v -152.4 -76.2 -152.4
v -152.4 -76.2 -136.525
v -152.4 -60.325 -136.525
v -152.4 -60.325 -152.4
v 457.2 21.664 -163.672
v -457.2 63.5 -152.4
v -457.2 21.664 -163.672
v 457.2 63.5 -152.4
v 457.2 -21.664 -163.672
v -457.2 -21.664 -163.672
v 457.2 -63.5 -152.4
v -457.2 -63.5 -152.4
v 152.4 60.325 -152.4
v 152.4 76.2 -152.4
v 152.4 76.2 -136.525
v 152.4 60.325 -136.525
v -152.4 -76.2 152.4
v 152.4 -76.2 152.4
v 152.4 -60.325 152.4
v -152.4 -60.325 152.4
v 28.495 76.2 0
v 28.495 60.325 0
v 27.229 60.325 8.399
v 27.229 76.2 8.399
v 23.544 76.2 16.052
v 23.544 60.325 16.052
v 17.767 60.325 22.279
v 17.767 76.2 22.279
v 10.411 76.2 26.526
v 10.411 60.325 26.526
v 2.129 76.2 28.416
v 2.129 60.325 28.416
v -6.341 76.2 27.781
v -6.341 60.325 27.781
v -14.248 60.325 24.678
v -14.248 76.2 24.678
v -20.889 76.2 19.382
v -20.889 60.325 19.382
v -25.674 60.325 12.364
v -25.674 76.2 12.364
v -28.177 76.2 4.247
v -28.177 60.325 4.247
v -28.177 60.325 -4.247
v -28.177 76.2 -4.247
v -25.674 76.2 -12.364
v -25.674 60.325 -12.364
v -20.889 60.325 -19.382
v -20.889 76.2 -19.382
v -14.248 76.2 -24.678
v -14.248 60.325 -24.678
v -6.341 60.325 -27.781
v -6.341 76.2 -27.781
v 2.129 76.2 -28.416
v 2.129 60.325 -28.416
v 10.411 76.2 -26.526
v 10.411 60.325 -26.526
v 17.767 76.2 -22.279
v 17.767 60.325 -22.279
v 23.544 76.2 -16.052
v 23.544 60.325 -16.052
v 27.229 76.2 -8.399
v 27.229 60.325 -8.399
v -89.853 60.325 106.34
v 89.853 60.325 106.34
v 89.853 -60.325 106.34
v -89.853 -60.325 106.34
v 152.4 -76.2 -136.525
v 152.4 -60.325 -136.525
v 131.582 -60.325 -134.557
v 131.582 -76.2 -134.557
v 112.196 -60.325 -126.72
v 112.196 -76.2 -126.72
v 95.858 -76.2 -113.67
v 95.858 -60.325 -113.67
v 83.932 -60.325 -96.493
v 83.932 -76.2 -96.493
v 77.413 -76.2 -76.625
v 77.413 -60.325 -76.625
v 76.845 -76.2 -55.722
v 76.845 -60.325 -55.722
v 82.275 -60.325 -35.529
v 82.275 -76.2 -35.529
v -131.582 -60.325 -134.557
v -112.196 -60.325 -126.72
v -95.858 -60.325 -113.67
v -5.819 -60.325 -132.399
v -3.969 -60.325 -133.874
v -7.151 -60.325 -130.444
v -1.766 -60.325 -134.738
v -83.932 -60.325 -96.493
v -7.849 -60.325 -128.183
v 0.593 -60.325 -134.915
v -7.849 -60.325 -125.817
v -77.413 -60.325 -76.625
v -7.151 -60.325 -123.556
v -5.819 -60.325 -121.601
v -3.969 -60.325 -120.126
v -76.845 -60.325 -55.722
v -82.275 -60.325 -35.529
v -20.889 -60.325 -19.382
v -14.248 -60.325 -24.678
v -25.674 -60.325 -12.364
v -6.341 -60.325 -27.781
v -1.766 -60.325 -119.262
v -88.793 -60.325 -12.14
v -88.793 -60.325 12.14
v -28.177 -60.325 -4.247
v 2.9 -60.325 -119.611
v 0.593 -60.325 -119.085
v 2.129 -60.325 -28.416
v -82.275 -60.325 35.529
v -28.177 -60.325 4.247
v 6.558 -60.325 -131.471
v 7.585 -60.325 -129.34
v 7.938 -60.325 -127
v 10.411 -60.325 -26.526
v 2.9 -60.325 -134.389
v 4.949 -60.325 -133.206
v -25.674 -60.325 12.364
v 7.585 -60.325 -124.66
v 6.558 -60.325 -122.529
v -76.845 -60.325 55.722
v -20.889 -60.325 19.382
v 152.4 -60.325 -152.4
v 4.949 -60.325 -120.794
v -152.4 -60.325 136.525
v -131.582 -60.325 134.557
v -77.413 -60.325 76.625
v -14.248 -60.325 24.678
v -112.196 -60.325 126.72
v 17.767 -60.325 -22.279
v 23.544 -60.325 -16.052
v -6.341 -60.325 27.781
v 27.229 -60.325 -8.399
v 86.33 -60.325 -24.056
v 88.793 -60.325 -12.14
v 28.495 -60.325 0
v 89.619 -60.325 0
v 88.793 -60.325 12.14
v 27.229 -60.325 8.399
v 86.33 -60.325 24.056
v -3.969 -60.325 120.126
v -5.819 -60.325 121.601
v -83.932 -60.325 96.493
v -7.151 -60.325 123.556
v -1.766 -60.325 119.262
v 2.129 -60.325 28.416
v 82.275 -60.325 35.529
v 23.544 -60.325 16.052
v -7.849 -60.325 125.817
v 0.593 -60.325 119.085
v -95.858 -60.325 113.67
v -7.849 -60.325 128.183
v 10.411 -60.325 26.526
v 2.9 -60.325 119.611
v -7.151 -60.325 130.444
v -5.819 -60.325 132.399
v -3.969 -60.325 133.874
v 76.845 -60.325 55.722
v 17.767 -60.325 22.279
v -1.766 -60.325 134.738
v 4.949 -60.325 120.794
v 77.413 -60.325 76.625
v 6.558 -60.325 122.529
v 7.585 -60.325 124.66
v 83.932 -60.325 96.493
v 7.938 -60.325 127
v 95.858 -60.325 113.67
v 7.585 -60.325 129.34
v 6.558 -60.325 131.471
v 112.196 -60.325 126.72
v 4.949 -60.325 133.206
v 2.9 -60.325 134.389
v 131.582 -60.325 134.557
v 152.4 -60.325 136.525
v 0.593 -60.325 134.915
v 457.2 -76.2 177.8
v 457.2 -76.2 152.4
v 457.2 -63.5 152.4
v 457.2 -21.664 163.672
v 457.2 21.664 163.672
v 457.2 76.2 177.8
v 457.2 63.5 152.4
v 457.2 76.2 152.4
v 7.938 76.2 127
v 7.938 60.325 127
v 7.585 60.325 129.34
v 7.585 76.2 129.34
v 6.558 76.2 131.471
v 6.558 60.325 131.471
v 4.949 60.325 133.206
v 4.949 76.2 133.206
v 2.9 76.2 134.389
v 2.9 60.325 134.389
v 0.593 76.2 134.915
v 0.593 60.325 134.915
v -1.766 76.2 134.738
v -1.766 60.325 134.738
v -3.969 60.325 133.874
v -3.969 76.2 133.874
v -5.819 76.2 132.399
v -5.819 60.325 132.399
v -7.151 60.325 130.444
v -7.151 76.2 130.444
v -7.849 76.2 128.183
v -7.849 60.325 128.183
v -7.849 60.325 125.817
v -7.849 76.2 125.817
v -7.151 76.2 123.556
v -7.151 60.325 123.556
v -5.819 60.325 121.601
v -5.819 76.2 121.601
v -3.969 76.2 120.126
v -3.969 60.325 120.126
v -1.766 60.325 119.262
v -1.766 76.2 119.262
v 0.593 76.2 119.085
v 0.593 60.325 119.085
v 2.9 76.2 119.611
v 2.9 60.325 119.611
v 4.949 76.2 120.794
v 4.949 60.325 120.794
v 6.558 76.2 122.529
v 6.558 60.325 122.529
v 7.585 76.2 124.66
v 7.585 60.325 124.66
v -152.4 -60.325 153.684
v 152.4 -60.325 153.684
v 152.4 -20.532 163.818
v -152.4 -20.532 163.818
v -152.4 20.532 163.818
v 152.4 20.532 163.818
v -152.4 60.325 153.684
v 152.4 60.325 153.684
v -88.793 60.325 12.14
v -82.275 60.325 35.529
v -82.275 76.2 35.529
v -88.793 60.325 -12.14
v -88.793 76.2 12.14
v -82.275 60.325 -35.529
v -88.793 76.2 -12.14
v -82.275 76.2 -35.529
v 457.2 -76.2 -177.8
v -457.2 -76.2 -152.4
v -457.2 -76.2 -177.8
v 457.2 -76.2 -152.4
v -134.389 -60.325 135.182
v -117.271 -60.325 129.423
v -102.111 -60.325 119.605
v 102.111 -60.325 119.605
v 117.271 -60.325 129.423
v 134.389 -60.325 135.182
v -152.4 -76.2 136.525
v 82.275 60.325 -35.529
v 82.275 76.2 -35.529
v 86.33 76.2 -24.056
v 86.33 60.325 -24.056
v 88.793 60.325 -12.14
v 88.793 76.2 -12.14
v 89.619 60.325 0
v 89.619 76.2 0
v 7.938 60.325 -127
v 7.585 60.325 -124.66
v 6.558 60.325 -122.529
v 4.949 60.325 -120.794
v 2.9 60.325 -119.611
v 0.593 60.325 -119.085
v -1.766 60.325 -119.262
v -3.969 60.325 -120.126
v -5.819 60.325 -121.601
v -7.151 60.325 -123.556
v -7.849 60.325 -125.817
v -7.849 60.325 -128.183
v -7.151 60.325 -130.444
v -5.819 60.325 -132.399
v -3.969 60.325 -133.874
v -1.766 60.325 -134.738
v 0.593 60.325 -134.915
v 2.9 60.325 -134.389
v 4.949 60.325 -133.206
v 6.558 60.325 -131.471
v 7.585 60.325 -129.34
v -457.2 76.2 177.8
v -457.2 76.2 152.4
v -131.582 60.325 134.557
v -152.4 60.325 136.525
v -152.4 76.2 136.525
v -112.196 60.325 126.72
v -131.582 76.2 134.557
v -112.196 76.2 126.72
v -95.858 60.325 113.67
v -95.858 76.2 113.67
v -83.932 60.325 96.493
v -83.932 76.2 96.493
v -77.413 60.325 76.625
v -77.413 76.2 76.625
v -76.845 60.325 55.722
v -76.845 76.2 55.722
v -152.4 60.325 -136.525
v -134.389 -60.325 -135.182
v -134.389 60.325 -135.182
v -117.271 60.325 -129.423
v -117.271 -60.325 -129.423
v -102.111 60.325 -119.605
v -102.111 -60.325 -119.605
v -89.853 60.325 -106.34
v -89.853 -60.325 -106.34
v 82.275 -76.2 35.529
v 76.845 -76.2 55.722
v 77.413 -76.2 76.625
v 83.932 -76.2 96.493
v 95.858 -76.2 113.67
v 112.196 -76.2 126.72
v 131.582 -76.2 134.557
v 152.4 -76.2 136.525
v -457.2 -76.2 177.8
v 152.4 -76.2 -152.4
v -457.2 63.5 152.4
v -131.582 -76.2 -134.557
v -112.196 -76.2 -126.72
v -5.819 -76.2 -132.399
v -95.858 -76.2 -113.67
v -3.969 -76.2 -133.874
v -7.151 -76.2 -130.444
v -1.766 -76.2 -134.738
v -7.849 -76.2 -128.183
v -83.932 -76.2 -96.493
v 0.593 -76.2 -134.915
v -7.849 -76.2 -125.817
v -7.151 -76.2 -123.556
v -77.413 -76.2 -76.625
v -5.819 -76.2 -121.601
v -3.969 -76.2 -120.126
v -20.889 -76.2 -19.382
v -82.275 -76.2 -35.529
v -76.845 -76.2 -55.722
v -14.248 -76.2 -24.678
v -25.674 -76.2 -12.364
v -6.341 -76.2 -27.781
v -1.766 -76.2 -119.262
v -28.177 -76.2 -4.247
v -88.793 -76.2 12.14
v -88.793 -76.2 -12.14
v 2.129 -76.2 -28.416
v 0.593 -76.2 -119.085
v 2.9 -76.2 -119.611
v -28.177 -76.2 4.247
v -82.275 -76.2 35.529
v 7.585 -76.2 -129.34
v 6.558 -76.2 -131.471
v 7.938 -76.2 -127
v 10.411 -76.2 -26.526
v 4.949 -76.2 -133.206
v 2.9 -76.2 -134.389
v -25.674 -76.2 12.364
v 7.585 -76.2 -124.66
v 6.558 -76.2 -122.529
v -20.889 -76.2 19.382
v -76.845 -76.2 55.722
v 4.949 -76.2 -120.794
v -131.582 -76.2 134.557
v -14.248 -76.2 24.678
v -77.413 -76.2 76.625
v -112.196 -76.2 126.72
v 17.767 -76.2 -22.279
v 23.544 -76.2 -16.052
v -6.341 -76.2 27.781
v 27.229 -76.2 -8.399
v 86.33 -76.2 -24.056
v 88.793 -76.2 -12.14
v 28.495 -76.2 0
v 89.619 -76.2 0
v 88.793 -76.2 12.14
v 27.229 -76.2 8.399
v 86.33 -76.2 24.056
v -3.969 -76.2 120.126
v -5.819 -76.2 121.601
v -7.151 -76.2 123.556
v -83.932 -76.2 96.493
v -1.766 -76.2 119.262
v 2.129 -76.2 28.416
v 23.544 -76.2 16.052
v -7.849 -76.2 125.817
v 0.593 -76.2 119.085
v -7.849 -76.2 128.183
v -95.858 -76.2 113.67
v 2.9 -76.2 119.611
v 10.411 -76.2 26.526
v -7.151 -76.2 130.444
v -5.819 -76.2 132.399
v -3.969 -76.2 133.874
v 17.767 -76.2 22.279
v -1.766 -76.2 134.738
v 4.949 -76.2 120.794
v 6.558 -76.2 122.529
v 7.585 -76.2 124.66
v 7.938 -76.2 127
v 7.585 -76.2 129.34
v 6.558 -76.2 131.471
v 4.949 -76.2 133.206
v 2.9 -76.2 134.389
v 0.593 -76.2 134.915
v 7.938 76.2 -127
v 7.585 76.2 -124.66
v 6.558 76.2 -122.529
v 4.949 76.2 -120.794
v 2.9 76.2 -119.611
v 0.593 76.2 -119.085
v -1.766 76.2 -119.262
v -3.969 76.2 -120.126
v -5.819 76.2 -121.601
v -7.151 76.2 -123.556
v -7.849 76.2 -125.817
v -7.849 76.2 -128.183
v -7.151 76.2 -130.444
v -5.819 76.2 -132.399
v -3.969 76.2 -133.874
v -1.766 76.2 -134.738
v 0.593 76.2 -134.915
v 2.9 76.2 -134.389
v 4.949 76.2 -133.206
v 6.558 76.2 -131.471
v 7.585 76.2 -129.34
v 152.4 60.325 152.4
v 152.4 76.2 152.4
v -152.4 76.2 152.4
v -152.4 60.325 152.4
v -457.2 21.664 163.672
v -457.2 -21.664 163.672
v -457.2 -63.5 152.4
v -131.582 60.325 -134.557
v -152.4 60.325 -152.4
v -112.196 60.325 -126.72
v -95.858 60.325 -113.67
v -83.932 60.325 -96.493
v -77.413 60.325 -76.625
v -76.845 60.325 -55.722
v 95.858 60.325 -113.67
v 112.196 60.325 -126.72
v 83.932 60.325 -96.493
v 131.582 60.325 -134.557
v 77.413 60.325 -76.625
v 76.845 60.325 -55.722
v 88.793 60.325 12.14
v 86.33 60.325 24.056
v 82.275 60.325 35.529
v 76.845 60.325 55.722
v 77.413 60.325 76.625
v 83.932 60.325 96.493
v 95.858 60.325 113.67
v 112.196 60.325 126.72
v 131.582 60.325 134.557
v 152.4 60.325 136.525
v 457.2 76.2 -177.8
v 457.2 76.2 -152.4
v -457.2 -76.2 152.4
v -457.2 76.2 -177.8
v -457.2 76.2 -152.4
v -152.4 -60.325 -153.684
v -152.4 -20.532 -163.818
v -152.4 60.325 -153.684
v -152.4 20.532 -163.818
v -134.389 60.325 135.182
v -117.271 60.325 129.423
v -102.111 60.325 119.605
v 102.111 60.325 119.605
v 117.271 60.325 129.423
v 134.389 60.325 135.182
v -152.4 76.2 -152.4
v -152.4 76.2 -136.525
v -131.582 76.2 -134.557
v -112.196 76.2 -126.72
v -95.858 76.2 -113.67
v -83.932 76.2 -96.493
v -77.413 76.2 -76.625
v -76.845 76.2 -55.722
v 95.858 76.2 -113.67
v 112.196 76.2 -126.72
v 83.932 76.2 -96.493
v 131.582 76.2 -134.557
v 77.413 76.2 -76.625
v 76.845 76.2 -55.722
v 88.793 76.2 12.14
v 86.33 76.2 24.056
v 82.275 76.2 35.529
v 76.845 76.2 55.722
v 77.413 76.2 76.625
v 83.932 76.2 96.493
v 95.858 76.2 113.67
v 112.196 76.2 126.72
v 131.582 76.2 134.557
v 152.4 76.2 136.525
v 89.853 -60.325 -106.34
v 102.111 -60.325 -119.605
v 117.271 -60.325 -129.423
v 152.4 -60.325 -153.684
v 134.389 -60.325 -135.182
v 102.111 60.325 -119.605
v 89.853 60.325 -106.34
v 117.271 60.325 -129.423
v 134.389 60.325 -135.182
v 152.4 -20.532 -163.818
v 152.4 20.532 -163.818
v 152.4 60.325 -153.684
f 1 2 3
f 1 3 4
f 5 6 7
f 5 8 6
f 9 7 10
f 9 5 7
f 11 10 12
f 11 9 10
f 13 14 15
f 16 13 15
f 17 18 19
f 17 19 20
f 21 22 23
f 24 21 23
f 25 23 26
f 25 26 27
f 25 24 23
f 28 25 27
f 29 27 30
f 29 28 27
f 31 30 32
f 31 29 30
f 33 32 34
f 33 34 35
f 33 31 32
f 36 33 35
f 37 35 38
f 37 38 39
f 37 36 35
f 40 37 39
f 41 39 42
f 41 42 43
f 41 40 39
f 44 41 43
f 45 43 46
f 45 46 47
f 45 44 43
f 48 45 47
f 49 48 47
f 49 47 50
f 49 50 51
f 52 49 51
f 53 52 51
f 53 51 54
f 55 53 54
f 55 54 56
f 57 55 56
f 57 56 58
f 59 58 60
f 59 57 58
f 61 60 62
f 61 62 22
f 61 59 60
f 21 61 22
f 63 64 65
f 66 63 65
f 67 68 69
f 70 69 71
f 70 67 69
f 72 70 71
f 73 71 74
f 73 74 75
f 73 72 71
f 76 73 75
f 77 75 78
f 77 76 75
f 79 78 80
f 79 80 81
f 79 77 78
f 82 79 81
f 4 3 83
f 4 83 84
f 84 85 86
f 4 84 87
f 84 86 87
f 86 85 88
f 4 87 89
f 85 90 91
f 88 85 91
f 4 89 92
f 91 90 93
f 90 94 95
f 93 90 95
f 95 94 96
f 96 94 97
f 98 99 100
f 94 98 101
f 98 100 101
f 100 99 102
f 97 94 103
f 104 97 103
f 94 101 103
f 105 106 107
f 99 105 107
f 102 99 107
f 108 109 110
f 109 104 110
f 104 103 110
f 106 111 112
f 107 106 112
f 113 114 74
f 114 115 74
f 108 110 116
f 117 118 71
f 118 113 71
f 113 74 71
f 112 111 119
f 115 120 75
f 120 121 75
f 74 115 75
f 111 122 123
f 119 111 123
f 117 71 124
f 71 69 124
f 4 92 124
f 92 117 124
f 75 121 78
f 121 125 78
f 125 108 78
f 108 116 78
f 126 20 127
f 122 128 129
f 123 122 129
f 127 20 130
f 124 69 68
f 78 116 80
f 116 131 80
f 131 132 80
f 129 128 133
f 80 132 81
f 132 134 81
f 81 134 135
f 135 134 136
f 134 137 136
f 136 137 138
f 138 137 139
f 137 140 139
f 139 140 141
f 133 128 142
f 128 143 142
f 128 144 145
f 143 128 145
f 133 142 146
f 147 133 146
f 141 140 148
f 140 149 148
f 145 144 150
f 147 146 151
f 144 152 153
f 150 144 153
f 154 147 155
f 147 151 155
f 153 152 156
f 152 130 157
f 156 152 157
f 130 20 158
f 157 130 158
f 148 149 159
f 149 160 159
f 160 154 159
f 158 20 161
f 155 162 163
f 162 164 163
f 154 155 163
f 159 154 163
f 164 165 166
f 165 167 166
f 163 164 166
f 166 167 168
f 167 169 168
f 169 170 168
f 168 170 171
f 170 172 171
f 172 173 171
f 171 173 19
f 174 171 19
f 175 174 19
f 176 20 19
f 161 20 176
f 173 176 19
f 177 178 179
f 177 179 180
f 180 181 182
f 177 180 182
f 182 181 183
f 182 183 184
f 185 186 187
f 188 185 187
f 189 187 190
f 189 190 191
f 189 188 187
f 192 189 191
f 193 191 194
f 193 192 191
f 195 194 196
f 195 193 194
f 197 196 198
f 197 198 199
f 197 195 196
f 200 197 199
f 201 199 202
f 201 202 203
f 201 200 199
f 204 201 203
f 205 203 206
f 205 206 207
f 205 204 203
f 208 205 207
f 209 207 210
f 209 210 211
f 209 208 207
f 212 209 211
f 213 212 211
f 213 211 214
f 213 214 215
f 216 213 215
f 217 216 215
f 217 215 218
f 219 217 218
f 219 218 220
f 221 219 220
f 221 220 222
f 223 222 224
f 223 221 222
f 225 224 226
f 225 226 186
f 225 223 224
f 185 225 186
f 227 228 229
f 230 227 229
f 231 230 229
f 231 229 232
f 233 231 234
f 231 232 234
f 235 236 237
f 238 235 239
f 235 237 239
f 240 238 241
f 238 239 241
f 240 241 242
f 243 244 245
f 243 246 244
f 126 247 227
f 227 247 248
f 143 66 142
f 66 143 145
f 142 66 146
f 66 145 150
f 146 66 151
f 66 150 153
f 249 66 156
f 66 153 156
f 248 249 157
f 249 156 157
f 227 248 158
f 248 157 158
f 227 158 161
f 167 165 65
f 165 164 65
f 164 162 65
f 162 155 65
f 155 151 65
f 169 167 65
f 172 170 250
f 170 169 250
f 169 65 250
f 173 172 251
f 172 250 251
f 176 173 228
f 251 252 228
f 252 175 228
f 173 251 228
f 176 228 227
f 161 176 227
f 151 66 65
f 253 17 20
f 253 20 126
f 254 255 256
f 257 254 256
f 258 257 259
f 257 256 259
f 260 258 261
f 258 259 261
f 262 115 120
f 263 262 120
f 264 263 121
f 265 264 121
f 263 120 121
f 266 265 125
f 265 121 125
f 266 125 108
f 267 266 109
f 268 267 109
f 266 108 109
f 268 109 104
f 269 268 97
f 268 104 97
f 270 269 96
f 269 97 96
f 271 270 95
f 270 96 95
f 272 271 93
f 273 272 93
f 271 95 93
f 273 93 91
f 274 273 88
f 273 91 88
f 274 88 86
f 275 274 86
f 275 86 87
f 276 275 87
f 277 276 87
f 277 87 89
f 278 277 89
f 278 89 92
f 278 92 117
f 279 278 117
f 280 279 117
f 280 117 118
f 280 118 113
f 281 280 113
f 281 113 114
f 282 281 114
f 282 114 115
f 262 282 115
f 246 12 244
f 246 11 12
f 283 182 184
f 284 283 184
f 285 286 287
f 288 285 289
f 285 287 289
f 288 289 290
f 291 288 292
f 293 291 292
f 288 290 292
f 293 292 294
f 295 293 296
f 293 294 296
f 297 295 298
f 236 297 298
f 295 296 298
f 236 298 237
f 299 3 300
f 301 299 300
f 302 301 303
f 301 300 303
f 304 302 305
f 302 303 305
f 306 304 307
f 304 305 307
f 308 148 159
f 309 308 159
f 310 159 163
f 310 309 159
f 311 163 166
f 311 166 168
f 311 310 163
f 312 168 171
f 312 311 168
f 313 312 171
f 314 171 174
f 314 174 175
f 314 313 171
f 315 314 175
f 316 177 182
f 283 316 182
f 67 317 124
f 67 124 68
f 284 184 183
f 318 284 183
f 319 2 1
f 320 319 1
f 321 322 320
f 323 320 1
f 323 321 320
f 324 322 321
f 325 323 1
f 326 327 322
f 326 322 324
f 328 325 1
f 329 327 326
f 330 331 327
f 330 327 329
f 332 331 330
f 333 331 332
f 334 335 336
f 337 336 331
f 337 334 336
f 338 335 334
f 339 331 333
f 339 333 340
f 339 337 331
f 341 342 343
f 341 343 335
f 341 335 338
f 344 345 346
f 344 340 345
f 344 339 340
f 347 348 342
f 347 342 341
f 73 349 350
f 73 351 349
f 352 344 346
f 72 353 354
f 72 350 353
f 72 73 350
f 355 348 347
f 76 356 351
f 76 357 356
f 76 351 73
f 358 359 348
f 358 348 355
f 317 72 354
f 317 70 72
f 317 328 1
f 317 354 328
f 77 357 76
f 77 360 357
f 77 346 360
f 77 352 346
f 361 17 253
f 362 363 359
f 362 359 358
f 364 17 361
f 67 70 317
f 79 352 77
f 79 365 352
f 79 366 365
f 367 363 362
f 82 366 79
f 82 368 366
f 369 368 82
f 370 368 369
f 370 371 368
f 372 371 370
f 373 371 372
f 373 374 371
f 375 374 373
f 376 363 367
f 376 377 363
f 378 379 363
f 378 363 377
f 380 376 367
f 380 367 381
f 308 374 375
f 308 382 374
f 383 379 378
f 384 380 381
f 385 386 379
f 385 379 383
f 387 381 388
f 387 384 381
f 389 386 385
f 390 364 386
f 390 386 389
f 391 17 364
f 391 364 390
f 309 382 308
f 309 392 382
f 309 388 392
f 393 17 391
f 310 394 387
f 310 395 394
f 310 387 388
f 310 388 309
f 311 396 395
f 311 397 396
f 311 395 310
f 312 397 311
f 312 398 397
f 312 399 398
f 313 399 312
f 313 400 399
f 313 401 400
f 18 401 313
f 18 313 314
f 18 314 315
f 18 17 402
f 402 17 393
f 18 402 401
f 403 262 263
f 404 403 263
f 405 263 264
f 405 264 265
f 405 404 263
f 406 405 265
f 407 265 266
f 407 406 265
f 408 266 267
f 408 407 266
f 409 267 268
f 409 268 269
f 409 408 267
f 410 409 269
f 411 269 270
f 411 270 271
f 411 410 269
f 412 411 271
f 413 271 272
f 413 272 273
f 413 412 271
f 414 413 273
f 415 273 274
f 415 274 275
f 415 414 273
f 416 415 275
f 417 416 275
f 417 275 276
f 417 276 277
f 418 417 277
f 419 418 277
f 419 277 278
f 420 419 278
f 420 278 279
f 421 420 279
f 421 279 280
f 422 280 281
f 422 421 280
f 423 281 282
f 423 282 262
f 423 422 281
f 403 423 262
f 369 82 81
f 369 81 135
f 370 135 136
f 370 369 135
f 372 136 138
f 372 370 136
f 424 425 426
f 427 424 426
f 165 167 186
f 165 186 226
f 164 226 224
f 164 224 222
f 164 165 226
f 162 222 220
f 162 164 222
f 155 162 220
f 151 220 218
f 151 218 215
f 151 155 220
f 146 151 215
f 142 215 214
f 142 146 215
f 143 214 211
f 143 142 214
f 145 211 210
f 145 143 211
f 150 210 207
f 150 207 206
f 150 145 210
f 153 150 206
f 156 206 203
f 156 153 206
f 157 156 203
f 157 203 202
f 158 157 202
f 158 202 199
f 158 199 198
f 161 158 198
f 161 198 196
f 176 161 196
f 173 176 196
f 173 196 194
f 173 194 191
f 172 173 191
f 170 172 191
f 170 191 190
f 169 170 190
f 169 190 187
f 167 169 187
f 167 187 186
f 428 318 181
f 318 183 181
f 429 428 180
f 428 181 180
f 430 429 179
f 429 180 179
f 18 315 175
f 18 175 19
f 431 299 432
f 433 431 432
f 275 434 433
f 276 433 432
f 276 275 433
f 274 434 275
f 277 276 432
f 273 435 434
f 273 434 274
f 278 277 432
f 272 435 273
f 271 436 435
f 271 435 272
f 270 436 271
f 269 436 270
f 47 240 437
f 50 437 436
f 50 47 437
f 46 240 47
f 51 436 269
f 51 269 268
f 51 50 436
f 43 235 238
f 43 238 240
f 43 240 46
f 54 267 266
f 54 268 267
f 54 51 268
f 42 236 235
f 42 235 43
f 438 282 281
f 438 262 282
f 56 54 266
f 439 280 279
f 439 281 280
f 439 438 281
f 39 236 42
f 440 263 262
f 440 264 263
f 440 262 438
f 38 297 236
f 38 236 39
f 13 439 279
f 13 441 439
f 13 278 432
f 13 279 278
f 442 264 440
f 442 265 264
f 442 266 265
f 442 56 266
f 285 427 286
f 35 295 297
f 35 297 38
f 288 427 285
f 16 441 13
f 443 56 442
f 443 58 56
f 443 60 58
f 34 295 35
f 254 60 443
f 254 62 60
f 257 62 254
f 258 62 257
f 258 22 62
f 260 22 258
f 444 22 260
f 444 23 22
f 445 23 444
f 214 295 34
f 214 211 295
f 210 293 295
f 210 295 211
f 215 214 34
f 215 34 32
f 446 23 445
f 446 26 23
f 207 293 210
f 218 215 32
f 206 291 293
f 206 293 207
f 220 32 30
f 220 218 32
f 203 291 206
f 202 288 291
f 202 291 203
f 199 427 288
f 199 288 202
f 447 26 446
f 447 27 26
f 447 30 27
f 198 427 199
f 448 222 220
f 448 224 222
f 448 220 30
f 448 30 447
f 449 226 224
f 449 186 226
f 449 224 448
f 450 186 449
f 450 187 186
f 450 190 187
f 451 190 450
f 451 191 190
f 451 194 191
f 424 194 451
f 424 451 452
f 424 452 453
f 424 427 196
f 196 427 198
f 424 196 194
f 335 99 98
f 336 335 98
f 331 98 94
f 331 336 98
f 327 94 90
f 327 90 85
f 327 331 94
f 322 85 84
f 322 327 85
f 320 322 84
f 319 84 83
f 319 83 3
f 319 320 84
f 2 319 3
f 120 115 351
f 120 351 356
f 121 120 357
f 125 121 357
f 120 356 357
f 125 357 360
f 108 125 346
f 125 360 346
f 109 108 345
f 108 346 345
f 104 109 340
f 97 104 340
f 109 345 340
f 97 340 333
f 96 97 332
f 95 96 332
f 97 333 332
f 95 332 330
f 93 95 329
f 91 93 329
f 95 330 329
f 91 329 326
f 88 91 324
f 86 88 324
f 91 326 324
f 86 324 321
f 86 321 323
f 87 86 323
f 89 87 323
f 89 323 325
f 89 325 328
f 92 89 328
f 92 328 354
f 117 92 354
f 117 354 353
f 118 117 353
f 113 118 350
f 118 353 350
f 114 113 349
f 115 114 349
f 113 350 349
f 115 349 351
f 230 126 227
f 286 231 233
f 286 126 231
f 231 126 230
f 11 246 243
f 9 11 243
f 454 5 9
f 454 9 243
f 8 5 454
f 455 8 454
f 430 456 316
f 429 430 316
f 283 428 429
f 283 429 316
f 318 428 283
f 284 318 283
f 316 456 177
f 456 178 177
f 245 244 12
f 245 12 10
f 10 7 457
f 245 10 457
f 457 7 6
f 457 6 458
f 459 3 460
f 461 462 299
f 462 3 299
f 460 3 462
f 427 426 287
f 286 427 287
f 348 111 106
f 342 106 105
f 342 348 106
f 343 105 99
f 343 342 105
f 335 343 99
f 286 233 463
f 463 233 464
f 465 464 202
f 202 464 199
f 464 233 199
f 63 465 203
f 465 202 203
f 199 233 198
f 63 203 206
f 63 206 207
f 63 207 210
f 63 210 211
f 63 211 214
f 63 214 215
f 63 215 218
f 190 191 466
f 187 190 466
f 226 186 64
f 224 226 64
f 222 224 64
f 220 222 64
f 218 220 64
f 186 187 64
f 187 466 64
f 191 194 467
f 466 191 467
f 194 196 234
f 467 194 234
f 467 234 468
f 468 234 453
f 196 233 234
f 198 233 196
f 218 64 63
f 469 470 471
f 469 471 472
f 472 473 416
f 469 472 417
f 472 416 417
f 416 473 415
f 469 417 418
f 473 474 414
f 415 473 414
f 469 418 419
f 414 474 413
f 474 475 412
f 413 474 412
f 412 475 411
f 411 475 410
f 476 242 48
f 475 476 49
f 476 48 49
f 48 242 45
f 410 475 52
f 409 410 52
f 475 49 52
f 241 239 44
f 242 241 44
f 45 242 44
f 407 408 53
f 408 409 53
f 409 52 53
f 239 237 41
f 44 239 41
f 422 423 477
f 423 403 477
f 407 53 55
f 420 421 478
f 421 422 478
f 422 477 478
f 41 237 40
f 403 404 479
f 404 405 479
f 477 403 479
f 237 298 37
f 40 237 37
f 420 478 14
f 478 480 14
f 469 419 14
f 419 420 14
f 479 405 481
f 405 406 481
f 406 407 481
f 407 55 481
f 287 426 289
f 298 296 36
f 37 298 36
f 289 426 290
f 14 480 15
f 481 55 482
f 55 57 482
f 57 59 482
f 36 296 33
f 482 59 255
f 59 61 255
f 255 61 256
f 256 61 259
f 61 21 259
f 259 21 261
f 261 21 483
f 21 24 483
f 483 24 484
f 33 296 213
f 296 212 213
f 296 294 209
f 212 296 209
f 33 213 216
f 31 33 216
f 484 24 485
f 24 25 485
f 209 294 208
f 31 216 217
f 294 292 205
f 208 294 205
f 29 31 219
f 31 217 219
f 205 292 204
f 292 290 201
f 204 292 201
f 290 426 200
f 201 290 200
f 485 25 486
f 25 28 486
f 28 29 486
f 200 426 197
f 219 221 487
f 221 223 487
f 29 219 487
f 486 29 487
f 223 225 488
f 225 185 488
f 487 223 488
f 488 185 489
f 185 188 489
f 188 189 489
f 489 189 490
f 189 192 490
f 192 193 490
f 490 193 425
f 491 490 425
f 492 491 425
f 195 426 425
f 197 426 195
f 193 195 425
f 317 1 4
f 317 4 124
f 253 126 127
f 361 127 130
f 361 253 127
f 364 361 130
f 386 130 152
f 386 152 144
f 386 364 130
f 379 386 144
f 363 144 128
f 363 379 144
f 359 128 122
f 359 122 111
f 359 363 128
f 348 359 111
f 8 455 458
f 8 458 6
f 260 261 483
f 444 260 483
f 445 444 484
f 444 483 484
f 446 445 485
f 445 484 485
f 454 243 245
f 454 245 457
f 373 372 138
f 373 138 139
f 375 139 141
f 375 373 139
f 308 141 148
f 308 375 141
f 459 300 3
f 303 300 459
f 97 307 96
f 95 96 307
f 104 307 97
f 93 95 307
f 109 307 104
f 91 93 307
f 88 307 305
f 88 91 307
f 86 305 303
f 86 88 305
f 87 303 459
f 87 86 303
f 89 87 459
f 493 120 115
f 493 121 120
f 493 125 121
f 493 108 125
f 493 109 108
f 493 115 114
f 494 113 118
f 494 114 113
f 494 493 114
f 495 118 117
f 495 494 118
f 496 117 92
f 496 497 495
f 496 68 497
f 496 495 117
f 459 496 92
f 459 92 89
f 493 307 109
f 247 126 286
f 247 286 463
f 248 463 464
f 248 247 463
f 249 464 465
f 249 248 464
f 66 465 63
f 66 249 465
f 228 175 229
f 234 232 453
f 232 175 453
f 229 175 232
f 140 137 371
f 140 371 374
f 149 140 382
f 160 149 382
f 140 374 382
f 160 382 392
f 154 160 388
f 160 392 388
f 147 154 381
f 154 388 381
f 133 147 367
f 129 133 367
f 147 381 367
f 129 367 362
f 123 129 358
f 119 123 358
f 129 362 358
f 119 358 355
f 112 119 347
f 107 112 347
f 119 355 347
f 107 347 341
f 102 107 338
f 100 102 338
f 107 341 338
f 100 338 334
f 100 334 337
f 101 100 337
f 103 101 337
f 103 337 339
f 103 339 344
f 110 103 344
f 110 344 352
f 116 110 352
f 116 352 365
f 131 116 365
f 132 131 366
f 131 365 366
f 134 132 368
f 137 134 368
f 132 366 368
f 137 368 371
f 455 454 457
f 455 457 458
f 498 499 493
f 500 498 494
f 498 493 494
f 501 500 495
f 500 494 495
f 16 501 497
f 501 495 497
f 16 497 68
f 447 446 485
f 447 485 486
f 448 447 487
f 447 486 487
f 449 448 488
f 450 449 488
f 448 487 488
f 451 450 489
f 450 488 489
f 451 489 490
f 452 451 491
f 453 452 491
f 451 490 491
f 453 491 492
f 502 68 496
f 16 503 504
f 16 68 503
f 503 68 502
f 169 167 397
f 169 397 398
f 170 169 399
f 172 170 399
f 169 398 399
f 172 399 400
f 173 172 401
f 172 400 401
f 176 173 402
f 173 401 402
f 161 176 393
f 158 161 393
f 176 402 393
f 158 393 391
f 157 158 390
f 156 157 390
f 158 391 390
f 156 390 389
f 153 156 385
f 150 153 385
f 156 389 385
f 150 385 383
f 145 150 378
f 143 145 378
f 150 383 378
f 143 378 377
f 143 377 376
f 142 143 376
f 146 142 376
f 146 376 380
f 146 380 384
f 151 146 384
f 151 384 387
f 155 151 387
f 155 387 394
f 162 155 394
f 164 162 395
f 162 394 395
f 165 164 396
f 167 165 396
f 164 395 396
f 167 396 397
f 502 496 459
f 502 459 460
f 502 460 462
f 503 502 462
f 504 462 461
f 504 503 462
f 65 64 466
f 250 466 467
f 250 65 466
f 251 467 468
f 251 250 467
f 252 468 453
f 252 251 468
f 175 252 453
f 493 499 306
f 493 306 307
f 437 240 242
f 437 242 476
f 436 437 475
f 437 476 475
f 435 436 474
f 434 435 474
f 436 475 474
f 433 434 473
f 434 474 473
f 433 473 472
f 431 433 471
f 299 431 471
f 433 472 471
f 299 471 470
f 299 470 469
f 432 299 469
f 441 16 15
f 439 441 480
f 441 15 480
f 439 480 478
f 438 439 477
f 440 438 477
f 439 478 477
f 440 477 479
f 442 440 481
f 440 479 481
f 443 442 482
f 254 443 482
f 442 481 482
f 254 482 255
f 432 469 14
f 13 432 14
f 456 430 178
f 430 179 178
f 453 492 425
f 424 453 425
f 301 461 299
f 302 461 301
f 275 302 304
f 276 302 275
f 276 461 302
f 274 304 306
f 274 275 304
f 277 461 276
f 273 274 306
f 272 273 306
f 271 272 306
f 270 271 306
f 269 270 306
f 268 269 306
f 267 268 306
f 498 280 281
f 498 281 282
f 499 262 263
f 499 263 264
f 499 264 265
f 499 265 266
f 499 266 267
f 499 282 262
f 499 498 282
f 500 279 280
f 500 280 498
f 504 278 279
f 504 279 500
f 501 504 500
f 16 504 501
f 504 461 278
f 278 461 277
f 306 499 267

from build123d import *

# Parameters (mm, degrees)
F3_DEPTH  = 457.2
F5_R      = 7.9375
F5_R_2    = 28.4954486751
F6_DEPTH  = 15.875
F8_DEPTH  = 152.4
F9_R      = 7.9375
F10_DEPTH = 136.526


# Not quite as in the source:
# - a variable given as a bare number and used for a length is read in inches; the dataset says mm whatever the document's units were


with BuildPart() as f3:
    # F2 (on Right) → F3 (new body, symmetric)
    with BuildSketch(Plane.YZ):
        with BuildLine():
            Line((-76.2, -152.4), (-76.2, -177.8))
            Line((-76.2, -177.8), (76.2, -177.8))
            Line((76.2, -177.8), (76.2, -152.4))
            Line((76.2, -152.4), (63.5, -152.4))
            ThreePointArc((63.5, -152.4), (0, -165.1), (-63.5, -152.4))
            Line((-63.5, -152.4), (-76.2, -152.4))
        make_face()
    extrude(amount=F3_DEPTH, both=True)


with BuildPart() as f6:
    # F5 (on offset) → F6 (new body)
    with BuildSketch(Plane.XZ.offset(76.2)):
        with BuildLine():
            ThreePointArc((-82.2750366967, 35.5290866249), (0, 89.6186233985), (82.2750366967, 35.5290866249))
            ThreePointArc((82.2750366967, 35.5290866249), (89.271178874, 105.5144756245), (152.4, 136.525))
            Line((152.4, 136.525), (152.4, 152.4))
            Line((152.4, 152.4), (0, 152.4))
            Line((0, 152.4), (-152.4, 152.4))
            Line((-152.4, 152.4), (-152.4, 136.525))
            ThreePointArc((-152.4, 136.525), (-89.271178874, 105.5144756245), (-82.2750366967, 35.5290866249))
        make_face()
        with Locations((0, 127)):
            Circle(F5_R, mode=Mode.SUBTRACT)
        with BuildLine():
            ThreePointArc((82.2750366967, -35.5290866249), (87.7635265605, -18.1400403944), (89.6186233985, 0))
            ThreePointArc((89.6186233985, 0), (87.7635265605, 18.1400403944), (82.2750366967, 35.5290866249))
            ThreePointArc((82.2750366967, 35.5290866249), (0, 89.6186233985), (-82.2750366967, 35.5290866249))
            ThreePointArc((-82.2750366967, 35.5290866249), (-89.6186233985, 0), (-82.2750366967, -35.5290866249))
            ThreePointArc((-82.2750366967, -35.5290866249), (0, -89.6186233985), (82.2750366967, -35.5290866249))
        make_face()
        Circle(F5_R_2, mode=Mode.SUBTRACT)
        with BuildLine():
            ThreePointArc((152.4, -136.525), (89.271178874, -105.5144756245), (82.2750366967, -35.5290866249))
            ThreePointArc((82.2750366967, -35.5290866249), (0, -89.6186233985), (-82.2750366967, -35.5290866249))
            ThreePointArc((-82.2750366967, -35.5290866249), (-89.271178874, -105.5144756245), (-152.4, -136.525))
            Line((-152.4, -136.525), (-152.4, -152.4))
            Line((-152.4, -152.4), (0, -152.4))
            Line((0, -152.4), (152.4, -152.4))
            Line((152.4, -152.4), (152.4, -136.525))
        make_face()
        with Locations((0, -127)):
            Circle(F5_R, mode=Mode.SUBTRACT)
    extrude(amount=-F6_DEPTH)


with BuildPart() as f8:
    # F7 (on Right) → F8 (new body, symmetric)
    with BuildSketch(Plane.YZ):
        with BuildLine():
            Line((-60.325, -106.3404455781), (-60.325, -153.6844311406))
            ThreePointArc((-60.325, -153.6844311406), (0, -165.1), (60.325, -153.6844311406))
            Line((60.325, -153.6844311406), (60.325, -106.3404455781))
            Line((60.325, -106.3404455781), (-60.325, -106.3404455781))
        make_face()
    extrude(amount=F8_DEPTH, both=True)

    # F9 (on face) → F10 (cut, through all)
    with BuildSketch(Plane.XZ.offset(60.325)):
        with BuildLine():
            Line((217.5968876211, -86.5462123202), (82.2750366967, -35.5290866249))
            ThreePointArc((82.2750366967, -35.5290866249), (123.1963063092, -131.9640231824), (217.5968876211, -86.5462123202))
        make_face()
        with Locations((0, -127)):
            Circle(F9_R)
        with BuildLine():
            ThreePointArc((-217.5968876211, -86.5462123202), (-123.1963063092, -131.9640231824), (-82.2750366967, -35.5290866249))
            Line((-82.2750366967, -35.5290866249), (-217.5968876211, -86.5462123202))
        make_face()
    extrude(amount=-F10_DEPTH, mode=Mode.SUBTRACT)


with BuildPart() as f11_1:
    # F11: instance of F3
    add(f3.part.mirror(Plane.XY))


with BuildPart() as f11_2:
    # F11: instance of F8
    add(f8.part.mirror(Plane.XY))


with BuildPart() as f12_1:
    # F12: instance of F6
    add(f6.part.mirror(Plane.XZ))


solid = Compound([f3.part, f6.part, f8.part, f11_1.part, f11_2.part, f12_1.part])
